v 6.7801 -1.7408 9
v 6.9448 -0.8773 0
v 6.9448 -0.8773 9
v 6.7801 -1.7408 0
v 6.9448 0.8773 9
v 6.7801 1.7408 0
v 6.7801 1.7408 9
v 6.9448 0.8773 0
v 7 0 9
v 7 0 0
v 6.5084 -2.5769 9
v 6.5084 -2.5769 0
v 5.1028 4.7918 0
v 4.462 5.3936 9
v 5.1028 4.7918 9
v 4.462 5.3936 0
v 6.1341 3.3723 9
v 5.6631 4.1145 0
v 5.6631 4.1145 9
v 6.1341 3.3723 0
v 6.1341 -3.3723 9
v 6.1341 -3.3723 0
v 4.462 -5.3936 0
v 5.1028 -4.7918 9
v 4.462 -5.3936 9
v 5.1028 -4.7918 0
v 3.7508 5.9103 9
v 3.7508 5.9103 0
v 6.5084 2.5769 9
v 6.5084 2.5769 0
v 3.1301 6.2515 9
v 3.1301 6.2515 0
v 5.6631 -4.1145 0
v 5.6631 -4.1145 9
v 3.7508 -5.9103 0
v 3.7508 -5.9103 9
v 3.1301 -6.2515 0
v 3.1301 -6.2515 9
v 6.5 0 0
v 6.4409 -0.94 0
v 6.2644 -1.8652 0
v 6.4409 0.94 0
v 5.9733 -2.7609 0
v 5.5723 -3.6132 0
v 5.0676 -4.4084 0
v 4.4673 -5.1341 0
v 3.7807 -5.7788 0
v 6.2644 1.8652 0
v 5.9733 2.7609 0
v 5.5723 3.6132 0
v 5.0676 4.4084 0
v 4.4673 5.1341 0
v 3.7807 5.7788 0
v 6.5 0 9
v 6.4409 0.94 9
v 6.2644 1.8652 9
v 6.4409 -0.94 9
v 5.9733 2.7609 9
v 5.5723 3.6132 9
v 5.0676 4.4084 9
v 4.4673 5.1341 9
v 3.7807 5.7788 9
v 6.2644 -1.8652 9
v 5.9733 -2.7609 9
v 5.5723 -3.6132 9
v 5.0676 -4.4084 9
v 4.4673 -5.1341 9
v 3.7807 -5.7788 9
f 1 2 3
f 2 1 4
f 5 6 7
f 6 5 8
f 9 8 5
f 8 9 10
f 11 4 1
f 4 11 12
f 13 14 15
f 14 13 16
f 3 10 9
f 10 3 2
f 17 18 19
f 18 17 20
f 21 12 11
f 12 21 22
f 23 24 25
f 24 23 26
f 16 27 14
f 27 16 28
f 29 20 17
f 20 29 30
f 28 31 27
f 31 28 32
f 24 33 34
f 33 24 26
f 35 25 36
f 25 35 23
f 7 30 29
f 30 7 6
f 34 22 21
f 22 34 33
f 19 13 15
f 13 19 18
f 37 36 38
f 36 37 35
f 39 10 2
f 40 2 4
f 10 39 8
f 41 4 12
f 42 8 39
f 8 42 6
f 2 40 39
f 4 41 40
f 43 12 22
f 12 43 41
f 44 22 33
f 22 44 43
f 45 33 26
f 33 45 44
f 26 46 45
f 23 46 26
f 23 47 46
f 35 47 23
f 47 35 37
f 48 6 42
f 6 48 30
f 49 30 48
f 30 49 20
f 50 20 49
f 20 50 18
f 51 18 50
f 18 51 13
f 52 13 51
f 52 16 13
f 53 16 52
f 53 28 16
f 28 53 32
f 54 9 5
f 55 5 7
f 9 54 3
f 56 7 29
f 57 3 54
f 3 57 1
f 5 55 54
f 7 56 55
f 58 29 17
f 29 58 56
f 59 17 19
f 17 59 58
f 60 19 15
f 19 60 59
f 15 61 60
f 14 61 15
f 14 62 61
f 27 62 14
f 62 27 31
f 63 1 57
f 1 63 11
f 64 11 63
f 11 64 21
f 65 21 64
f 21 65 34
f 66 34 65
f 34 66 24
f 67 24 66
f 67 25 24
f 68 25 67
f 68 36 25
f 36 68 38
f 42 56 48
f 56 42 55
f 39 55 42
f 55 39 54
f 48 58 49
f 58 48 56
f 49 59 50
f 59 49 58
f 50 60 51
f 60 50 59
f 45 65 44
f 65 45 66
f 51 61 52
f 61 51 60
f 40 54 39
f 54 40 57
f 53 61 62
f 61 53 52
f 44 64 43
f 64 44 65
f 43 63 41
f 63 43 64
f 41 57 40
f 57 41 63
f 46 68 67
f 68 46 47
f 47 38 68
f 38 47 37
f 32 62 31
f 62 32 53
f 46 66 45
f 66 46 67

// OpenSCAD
$fn = 50;


difference() {
	union() {
		cylinder(h = 9, r = 7.0000000000);
		translate(v = [-4.0000000000, 0, 0]) {
			cylinder(h = 9, r = 7.0000000000);
		}
	}
	union() {
		cylinder(h = 9, r = 3.2500000000);
		cylinder(h = 9, r = 1.8000000000);
		cylinder(h = 9, r = 1.8000000000);
		cylinder(h = 9, r = 1.8000000000);
		translate(v = [-8.5000000000, 0, 0]) {
			hull() {
				translate(v = [-3.7500000000, 0.0000000000, 0]) {
					cylinder(h = 9, r = 7.5000000000);
				}
				translate(v = [3.7500000000, 0.0000000000, 0]) {
					cylinder(h = 9, r = 7.5000000000);
				}
				translate(v = [-3.7500000000, -0.0000000000, 0]) {
					cylinder(h = 9, r = 7.5000000000);
				}
				translate(v = [3.7500000000, -0.0000000000, 0]) {
					cylinder(h = 9, r = 7.5000000000);
				}
			}
		}
		translate(v = [-1.0000000000, 0, 0.0000000000]) {
			cylinder(h = 9, r = 7.5000000000);
		}
	}
}
